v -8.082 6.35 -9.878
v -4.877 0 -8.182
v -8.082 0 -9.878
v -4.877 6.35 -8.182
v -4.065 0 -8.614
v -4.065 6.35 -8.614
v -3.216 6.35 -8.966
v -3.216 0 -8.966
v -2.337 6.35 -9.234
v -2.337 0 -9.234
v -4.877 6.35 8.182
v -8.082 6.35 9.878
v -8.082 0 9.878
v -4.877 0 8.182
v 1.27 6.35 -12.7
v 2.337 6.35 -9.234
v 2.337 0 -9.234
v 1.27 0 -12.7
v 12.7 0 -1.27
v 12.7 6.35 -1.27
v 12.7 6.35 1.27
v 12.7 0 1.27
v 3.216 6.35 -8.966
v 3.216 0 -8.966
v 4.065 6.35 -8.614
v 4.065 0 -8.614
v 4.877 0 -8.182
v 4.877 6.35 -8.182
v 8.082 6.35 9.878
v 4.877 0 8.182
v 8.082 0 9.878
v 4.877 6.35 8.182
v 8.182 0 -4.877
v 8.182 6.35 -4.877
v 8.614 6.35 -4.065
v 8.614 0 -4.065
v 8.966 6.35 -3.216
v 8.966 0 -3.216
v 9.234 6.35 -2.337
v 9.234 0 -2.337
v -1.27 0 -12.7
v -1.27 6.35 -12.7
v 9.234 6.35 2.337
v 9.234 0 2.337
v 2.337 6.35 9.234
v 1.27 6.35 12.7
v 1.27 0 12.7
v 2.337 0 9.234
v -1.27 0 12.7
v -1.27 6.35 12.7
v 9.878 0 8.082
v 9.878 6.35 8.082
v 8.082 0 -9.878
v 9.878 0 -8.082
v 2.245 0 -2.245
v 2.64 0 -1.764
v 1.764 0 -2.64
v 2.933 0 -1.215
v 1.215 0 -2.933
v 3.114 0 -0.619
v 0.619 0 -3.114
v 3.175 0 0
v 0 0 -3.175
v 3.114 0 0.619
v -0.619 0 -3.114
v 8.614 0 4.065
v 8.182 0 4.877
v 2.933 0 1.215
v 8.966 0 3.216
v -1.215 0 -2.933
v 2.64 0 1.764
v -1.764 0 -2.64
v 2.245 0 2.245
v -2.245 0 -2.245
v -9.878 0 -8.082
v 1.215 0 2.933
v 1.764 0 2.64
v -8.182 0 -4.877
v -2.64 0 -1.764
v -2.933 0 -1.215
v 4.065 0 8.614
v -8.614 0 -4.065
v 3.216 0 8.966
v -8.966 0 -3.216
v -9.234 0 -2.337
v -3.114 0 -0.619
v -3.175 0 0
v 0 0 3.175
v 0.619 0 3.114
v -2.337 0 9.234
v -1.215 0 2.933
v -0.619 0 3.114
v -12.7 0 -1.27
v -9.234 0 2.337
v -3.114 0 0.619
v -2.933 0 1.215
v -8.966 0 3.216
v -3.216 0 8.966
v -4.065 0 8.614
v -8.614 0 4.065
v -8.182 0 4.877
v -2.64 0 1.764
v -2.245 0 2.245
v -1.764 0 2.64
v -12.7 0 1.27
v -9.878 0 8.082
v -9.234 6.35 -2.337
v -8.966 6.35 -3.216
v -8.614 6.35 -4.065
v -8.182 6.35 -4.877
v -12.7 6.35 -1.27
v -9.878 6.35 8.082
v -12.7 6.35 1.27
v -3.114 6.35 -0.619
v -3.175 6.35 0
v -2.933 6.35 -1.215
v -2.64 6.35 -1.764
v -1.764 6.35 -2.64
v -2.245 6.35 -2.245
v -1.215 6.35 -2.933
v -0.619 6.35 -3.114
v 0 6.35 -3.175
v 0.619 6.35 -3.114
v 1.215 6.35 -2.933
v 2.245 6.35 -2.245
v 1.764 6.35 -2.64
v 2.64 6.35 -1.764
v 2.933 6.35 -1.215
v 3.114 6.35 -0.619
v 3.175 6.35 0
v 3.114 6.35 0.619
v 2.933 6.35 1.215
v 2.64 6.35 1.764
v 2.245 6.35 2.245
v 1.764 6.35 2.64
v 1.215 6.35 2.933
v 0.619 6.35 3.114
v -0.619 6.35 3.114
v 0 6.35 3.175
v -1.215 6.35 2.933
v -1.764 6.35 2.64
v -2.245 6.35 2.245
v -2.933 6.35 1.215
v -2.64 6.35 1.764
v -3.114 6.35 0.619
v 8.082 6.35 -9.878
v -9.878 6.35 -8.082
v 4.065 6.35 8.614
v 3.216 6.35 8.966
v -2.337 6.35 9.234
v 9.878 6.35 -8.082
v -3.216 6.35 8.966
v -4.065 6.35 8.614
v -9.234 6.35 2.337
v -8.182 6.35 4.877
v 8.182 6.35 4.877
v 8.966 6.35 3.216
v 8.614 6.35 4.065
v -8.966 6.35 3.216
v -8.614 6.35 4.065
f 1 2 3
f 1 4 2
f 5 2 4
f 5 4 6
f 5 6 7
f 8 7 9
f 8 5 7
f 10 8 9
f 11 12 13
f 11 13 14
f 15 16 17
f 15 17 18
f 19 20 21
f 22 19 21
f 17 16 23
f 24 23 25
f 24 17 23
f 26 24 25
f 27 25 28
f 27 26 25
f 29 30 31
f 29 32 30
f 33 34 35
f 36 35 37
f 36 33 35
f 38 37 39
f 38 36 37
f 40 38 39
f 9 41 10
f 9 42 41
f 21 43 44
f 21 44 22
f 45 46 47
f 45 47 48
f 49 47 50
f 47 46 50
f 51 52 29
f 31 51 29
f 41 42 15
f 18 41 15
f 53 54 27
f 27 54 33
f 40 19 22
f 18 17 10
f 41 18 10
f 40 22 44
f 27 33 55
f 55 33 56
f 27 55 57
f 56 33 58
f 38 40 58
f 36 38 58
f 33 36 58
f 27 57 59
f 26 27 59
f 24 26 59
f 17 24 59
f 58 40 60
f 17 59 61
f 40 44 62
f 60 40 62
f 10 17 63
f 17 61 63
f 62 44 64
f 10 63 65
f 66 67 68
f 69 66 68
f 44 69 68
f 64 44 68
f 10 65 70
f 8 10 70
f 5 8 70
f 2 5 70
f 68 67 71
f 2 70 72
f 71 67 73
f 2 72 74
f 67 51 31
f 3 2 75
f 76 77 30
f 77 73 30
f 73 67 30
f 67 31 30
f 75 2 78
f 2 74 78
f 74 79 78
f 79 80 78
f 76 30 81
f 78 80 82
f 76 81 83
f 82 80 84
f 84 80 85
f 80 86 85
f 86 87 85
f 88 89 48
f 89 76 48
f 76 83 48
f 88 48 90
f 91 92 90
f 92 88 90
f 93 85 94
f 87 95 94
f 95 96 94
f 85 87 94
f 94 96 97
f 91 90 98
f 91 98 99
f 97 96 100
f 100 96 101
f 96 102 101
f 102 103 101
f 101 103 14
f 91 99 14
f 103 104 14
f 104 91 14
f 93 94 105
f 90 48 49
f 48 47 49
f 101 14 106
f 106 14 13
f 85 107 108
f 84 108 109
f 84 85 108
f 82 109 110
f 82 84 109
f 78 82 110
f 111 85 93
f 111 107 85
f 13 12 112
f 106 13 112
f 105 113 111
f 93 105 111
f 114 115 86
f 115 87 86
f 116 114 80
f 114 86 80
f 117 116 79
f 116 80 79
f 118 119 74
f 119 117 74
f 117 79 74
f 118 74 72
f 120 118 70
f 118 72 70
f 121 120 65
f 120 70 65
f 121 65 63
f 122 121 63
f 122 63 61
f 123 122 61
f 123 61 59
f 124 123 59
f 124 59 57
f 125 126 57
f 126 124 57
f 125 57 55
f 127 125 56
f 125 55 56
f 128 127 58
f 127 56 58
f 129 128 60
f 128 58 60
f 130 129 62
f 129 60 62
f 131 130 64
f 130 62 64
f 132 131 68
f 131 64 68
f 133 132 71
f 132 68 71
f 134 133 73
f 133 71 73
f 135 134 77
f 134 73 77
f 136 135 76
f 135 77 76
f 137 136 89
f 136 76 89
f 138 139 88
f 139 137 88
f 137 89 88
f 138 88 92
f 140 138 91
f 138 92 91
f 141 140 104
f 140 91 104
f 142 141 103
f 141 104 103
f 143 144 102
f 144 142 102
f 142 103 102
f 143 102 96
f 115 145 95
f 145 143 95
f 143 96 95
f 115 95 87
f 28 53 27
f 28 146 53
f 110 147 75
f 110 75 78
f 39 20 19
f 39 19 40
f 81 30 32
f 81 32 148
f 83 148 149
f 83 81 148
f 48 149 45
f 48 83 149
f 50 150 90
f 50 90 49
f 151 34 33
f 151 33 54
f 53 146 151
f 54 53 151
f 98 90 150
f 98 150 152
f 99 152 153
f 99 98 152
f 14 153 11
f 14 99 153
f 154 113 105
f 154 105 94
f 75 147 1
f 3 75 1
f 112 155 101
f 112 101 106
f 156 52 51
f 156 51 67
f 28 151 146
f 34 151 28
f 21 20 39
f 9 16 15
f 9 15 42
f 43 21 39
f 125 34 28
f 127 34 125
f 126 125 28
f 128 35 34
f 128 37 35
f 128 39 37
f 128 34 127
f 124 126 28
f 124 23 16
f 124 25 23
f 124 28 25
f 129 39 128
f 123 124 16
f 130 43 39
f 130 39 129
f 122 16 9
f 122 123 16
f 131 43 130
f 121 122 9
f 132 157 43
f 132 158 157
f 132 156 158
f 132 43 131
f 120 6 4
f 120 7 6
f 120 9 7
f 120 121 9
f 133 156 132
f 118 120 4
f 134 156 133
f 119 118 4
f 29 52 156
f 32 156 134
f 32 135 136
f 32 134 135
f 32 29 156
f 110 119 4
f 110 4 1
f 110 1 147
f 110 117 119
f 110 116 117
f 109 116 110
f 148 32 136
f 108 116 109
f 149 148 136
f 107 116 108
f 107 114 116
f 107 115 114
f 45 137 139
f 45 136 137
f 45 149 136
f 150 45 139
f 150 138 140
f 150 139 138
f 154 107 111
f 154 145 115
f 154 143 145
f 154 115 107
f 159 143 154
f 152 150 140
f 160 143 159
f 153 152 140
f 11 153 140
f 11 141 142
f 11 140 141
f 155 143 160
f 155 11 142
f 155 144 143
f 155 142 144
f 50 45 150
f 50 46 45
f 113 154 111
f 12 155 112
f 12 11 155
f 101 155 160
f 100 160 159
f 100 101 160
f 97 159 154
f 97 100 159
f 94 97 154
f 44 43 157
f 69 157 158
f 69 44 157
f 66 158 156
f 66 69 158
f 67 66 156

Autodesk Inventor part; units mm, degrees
ref_plane "YZ Plane" through (0, 0, 0) normal (1, 0, 0) x (0, 1, 0)
ref_plane "XZ Plane" through (0, 0, 0) normal (0, 1, 0) x (-1, 0, 0)
ref_plane "XY Plane" through (0, 0, 0) normal (0, 0, 1) x (1, 0, 0)
sketch "Sketch1" plane through (0, 0, 0) normal (0, 1, 0) x (-1, 0, 0)
  circle A0 centre (0, 0) radius 9.525
  circle A1 centre (0, 0) radius 3.175
  dimension "d0" = 19.05
  dimension "d1" = 6.35
extrude "Extrusion1" add sketch "Sketch1" along normal blind 6.35
sketch "Sketch2" plane through (0, 6.35, 0) normal (0, 1, 0) x (1, 0, 0)
  circle A0 centre (0, 0) radius 9.525 projected
  line L0 (0, -9.525) -> (0, -12.7)
  line L1 (0, -12.7) -> (-1.27, -12.7)
  line L2 (0, -12.7) -> (1.27, -12.7)
  line L3 (-2.3368, -9.2339) -> (2.3368, -9.2339)
  line L4 (1.27, -12.7) -> (2.3368, -9.2339)
  line L5 (-2.3368, -9.2339) -> (-1.27, -12.7)
  dimension "d4" = 3.175
  dimension "d5" = 1.27
  dimension "d6" = 1.27
  dimension "d12" = 4.6736
extrude "Extrusion2" add sketch "Sketch2" against normal blind 6.35 contours A0 L0 L1 L5 | L4 L2 L0 A0
pattern_circular "Circular Pattern1" count 8 over 360 about axis through (0, 0, 0) along (0, 1, 0) of "Extrusion2"
properties part number "drivenGear"
